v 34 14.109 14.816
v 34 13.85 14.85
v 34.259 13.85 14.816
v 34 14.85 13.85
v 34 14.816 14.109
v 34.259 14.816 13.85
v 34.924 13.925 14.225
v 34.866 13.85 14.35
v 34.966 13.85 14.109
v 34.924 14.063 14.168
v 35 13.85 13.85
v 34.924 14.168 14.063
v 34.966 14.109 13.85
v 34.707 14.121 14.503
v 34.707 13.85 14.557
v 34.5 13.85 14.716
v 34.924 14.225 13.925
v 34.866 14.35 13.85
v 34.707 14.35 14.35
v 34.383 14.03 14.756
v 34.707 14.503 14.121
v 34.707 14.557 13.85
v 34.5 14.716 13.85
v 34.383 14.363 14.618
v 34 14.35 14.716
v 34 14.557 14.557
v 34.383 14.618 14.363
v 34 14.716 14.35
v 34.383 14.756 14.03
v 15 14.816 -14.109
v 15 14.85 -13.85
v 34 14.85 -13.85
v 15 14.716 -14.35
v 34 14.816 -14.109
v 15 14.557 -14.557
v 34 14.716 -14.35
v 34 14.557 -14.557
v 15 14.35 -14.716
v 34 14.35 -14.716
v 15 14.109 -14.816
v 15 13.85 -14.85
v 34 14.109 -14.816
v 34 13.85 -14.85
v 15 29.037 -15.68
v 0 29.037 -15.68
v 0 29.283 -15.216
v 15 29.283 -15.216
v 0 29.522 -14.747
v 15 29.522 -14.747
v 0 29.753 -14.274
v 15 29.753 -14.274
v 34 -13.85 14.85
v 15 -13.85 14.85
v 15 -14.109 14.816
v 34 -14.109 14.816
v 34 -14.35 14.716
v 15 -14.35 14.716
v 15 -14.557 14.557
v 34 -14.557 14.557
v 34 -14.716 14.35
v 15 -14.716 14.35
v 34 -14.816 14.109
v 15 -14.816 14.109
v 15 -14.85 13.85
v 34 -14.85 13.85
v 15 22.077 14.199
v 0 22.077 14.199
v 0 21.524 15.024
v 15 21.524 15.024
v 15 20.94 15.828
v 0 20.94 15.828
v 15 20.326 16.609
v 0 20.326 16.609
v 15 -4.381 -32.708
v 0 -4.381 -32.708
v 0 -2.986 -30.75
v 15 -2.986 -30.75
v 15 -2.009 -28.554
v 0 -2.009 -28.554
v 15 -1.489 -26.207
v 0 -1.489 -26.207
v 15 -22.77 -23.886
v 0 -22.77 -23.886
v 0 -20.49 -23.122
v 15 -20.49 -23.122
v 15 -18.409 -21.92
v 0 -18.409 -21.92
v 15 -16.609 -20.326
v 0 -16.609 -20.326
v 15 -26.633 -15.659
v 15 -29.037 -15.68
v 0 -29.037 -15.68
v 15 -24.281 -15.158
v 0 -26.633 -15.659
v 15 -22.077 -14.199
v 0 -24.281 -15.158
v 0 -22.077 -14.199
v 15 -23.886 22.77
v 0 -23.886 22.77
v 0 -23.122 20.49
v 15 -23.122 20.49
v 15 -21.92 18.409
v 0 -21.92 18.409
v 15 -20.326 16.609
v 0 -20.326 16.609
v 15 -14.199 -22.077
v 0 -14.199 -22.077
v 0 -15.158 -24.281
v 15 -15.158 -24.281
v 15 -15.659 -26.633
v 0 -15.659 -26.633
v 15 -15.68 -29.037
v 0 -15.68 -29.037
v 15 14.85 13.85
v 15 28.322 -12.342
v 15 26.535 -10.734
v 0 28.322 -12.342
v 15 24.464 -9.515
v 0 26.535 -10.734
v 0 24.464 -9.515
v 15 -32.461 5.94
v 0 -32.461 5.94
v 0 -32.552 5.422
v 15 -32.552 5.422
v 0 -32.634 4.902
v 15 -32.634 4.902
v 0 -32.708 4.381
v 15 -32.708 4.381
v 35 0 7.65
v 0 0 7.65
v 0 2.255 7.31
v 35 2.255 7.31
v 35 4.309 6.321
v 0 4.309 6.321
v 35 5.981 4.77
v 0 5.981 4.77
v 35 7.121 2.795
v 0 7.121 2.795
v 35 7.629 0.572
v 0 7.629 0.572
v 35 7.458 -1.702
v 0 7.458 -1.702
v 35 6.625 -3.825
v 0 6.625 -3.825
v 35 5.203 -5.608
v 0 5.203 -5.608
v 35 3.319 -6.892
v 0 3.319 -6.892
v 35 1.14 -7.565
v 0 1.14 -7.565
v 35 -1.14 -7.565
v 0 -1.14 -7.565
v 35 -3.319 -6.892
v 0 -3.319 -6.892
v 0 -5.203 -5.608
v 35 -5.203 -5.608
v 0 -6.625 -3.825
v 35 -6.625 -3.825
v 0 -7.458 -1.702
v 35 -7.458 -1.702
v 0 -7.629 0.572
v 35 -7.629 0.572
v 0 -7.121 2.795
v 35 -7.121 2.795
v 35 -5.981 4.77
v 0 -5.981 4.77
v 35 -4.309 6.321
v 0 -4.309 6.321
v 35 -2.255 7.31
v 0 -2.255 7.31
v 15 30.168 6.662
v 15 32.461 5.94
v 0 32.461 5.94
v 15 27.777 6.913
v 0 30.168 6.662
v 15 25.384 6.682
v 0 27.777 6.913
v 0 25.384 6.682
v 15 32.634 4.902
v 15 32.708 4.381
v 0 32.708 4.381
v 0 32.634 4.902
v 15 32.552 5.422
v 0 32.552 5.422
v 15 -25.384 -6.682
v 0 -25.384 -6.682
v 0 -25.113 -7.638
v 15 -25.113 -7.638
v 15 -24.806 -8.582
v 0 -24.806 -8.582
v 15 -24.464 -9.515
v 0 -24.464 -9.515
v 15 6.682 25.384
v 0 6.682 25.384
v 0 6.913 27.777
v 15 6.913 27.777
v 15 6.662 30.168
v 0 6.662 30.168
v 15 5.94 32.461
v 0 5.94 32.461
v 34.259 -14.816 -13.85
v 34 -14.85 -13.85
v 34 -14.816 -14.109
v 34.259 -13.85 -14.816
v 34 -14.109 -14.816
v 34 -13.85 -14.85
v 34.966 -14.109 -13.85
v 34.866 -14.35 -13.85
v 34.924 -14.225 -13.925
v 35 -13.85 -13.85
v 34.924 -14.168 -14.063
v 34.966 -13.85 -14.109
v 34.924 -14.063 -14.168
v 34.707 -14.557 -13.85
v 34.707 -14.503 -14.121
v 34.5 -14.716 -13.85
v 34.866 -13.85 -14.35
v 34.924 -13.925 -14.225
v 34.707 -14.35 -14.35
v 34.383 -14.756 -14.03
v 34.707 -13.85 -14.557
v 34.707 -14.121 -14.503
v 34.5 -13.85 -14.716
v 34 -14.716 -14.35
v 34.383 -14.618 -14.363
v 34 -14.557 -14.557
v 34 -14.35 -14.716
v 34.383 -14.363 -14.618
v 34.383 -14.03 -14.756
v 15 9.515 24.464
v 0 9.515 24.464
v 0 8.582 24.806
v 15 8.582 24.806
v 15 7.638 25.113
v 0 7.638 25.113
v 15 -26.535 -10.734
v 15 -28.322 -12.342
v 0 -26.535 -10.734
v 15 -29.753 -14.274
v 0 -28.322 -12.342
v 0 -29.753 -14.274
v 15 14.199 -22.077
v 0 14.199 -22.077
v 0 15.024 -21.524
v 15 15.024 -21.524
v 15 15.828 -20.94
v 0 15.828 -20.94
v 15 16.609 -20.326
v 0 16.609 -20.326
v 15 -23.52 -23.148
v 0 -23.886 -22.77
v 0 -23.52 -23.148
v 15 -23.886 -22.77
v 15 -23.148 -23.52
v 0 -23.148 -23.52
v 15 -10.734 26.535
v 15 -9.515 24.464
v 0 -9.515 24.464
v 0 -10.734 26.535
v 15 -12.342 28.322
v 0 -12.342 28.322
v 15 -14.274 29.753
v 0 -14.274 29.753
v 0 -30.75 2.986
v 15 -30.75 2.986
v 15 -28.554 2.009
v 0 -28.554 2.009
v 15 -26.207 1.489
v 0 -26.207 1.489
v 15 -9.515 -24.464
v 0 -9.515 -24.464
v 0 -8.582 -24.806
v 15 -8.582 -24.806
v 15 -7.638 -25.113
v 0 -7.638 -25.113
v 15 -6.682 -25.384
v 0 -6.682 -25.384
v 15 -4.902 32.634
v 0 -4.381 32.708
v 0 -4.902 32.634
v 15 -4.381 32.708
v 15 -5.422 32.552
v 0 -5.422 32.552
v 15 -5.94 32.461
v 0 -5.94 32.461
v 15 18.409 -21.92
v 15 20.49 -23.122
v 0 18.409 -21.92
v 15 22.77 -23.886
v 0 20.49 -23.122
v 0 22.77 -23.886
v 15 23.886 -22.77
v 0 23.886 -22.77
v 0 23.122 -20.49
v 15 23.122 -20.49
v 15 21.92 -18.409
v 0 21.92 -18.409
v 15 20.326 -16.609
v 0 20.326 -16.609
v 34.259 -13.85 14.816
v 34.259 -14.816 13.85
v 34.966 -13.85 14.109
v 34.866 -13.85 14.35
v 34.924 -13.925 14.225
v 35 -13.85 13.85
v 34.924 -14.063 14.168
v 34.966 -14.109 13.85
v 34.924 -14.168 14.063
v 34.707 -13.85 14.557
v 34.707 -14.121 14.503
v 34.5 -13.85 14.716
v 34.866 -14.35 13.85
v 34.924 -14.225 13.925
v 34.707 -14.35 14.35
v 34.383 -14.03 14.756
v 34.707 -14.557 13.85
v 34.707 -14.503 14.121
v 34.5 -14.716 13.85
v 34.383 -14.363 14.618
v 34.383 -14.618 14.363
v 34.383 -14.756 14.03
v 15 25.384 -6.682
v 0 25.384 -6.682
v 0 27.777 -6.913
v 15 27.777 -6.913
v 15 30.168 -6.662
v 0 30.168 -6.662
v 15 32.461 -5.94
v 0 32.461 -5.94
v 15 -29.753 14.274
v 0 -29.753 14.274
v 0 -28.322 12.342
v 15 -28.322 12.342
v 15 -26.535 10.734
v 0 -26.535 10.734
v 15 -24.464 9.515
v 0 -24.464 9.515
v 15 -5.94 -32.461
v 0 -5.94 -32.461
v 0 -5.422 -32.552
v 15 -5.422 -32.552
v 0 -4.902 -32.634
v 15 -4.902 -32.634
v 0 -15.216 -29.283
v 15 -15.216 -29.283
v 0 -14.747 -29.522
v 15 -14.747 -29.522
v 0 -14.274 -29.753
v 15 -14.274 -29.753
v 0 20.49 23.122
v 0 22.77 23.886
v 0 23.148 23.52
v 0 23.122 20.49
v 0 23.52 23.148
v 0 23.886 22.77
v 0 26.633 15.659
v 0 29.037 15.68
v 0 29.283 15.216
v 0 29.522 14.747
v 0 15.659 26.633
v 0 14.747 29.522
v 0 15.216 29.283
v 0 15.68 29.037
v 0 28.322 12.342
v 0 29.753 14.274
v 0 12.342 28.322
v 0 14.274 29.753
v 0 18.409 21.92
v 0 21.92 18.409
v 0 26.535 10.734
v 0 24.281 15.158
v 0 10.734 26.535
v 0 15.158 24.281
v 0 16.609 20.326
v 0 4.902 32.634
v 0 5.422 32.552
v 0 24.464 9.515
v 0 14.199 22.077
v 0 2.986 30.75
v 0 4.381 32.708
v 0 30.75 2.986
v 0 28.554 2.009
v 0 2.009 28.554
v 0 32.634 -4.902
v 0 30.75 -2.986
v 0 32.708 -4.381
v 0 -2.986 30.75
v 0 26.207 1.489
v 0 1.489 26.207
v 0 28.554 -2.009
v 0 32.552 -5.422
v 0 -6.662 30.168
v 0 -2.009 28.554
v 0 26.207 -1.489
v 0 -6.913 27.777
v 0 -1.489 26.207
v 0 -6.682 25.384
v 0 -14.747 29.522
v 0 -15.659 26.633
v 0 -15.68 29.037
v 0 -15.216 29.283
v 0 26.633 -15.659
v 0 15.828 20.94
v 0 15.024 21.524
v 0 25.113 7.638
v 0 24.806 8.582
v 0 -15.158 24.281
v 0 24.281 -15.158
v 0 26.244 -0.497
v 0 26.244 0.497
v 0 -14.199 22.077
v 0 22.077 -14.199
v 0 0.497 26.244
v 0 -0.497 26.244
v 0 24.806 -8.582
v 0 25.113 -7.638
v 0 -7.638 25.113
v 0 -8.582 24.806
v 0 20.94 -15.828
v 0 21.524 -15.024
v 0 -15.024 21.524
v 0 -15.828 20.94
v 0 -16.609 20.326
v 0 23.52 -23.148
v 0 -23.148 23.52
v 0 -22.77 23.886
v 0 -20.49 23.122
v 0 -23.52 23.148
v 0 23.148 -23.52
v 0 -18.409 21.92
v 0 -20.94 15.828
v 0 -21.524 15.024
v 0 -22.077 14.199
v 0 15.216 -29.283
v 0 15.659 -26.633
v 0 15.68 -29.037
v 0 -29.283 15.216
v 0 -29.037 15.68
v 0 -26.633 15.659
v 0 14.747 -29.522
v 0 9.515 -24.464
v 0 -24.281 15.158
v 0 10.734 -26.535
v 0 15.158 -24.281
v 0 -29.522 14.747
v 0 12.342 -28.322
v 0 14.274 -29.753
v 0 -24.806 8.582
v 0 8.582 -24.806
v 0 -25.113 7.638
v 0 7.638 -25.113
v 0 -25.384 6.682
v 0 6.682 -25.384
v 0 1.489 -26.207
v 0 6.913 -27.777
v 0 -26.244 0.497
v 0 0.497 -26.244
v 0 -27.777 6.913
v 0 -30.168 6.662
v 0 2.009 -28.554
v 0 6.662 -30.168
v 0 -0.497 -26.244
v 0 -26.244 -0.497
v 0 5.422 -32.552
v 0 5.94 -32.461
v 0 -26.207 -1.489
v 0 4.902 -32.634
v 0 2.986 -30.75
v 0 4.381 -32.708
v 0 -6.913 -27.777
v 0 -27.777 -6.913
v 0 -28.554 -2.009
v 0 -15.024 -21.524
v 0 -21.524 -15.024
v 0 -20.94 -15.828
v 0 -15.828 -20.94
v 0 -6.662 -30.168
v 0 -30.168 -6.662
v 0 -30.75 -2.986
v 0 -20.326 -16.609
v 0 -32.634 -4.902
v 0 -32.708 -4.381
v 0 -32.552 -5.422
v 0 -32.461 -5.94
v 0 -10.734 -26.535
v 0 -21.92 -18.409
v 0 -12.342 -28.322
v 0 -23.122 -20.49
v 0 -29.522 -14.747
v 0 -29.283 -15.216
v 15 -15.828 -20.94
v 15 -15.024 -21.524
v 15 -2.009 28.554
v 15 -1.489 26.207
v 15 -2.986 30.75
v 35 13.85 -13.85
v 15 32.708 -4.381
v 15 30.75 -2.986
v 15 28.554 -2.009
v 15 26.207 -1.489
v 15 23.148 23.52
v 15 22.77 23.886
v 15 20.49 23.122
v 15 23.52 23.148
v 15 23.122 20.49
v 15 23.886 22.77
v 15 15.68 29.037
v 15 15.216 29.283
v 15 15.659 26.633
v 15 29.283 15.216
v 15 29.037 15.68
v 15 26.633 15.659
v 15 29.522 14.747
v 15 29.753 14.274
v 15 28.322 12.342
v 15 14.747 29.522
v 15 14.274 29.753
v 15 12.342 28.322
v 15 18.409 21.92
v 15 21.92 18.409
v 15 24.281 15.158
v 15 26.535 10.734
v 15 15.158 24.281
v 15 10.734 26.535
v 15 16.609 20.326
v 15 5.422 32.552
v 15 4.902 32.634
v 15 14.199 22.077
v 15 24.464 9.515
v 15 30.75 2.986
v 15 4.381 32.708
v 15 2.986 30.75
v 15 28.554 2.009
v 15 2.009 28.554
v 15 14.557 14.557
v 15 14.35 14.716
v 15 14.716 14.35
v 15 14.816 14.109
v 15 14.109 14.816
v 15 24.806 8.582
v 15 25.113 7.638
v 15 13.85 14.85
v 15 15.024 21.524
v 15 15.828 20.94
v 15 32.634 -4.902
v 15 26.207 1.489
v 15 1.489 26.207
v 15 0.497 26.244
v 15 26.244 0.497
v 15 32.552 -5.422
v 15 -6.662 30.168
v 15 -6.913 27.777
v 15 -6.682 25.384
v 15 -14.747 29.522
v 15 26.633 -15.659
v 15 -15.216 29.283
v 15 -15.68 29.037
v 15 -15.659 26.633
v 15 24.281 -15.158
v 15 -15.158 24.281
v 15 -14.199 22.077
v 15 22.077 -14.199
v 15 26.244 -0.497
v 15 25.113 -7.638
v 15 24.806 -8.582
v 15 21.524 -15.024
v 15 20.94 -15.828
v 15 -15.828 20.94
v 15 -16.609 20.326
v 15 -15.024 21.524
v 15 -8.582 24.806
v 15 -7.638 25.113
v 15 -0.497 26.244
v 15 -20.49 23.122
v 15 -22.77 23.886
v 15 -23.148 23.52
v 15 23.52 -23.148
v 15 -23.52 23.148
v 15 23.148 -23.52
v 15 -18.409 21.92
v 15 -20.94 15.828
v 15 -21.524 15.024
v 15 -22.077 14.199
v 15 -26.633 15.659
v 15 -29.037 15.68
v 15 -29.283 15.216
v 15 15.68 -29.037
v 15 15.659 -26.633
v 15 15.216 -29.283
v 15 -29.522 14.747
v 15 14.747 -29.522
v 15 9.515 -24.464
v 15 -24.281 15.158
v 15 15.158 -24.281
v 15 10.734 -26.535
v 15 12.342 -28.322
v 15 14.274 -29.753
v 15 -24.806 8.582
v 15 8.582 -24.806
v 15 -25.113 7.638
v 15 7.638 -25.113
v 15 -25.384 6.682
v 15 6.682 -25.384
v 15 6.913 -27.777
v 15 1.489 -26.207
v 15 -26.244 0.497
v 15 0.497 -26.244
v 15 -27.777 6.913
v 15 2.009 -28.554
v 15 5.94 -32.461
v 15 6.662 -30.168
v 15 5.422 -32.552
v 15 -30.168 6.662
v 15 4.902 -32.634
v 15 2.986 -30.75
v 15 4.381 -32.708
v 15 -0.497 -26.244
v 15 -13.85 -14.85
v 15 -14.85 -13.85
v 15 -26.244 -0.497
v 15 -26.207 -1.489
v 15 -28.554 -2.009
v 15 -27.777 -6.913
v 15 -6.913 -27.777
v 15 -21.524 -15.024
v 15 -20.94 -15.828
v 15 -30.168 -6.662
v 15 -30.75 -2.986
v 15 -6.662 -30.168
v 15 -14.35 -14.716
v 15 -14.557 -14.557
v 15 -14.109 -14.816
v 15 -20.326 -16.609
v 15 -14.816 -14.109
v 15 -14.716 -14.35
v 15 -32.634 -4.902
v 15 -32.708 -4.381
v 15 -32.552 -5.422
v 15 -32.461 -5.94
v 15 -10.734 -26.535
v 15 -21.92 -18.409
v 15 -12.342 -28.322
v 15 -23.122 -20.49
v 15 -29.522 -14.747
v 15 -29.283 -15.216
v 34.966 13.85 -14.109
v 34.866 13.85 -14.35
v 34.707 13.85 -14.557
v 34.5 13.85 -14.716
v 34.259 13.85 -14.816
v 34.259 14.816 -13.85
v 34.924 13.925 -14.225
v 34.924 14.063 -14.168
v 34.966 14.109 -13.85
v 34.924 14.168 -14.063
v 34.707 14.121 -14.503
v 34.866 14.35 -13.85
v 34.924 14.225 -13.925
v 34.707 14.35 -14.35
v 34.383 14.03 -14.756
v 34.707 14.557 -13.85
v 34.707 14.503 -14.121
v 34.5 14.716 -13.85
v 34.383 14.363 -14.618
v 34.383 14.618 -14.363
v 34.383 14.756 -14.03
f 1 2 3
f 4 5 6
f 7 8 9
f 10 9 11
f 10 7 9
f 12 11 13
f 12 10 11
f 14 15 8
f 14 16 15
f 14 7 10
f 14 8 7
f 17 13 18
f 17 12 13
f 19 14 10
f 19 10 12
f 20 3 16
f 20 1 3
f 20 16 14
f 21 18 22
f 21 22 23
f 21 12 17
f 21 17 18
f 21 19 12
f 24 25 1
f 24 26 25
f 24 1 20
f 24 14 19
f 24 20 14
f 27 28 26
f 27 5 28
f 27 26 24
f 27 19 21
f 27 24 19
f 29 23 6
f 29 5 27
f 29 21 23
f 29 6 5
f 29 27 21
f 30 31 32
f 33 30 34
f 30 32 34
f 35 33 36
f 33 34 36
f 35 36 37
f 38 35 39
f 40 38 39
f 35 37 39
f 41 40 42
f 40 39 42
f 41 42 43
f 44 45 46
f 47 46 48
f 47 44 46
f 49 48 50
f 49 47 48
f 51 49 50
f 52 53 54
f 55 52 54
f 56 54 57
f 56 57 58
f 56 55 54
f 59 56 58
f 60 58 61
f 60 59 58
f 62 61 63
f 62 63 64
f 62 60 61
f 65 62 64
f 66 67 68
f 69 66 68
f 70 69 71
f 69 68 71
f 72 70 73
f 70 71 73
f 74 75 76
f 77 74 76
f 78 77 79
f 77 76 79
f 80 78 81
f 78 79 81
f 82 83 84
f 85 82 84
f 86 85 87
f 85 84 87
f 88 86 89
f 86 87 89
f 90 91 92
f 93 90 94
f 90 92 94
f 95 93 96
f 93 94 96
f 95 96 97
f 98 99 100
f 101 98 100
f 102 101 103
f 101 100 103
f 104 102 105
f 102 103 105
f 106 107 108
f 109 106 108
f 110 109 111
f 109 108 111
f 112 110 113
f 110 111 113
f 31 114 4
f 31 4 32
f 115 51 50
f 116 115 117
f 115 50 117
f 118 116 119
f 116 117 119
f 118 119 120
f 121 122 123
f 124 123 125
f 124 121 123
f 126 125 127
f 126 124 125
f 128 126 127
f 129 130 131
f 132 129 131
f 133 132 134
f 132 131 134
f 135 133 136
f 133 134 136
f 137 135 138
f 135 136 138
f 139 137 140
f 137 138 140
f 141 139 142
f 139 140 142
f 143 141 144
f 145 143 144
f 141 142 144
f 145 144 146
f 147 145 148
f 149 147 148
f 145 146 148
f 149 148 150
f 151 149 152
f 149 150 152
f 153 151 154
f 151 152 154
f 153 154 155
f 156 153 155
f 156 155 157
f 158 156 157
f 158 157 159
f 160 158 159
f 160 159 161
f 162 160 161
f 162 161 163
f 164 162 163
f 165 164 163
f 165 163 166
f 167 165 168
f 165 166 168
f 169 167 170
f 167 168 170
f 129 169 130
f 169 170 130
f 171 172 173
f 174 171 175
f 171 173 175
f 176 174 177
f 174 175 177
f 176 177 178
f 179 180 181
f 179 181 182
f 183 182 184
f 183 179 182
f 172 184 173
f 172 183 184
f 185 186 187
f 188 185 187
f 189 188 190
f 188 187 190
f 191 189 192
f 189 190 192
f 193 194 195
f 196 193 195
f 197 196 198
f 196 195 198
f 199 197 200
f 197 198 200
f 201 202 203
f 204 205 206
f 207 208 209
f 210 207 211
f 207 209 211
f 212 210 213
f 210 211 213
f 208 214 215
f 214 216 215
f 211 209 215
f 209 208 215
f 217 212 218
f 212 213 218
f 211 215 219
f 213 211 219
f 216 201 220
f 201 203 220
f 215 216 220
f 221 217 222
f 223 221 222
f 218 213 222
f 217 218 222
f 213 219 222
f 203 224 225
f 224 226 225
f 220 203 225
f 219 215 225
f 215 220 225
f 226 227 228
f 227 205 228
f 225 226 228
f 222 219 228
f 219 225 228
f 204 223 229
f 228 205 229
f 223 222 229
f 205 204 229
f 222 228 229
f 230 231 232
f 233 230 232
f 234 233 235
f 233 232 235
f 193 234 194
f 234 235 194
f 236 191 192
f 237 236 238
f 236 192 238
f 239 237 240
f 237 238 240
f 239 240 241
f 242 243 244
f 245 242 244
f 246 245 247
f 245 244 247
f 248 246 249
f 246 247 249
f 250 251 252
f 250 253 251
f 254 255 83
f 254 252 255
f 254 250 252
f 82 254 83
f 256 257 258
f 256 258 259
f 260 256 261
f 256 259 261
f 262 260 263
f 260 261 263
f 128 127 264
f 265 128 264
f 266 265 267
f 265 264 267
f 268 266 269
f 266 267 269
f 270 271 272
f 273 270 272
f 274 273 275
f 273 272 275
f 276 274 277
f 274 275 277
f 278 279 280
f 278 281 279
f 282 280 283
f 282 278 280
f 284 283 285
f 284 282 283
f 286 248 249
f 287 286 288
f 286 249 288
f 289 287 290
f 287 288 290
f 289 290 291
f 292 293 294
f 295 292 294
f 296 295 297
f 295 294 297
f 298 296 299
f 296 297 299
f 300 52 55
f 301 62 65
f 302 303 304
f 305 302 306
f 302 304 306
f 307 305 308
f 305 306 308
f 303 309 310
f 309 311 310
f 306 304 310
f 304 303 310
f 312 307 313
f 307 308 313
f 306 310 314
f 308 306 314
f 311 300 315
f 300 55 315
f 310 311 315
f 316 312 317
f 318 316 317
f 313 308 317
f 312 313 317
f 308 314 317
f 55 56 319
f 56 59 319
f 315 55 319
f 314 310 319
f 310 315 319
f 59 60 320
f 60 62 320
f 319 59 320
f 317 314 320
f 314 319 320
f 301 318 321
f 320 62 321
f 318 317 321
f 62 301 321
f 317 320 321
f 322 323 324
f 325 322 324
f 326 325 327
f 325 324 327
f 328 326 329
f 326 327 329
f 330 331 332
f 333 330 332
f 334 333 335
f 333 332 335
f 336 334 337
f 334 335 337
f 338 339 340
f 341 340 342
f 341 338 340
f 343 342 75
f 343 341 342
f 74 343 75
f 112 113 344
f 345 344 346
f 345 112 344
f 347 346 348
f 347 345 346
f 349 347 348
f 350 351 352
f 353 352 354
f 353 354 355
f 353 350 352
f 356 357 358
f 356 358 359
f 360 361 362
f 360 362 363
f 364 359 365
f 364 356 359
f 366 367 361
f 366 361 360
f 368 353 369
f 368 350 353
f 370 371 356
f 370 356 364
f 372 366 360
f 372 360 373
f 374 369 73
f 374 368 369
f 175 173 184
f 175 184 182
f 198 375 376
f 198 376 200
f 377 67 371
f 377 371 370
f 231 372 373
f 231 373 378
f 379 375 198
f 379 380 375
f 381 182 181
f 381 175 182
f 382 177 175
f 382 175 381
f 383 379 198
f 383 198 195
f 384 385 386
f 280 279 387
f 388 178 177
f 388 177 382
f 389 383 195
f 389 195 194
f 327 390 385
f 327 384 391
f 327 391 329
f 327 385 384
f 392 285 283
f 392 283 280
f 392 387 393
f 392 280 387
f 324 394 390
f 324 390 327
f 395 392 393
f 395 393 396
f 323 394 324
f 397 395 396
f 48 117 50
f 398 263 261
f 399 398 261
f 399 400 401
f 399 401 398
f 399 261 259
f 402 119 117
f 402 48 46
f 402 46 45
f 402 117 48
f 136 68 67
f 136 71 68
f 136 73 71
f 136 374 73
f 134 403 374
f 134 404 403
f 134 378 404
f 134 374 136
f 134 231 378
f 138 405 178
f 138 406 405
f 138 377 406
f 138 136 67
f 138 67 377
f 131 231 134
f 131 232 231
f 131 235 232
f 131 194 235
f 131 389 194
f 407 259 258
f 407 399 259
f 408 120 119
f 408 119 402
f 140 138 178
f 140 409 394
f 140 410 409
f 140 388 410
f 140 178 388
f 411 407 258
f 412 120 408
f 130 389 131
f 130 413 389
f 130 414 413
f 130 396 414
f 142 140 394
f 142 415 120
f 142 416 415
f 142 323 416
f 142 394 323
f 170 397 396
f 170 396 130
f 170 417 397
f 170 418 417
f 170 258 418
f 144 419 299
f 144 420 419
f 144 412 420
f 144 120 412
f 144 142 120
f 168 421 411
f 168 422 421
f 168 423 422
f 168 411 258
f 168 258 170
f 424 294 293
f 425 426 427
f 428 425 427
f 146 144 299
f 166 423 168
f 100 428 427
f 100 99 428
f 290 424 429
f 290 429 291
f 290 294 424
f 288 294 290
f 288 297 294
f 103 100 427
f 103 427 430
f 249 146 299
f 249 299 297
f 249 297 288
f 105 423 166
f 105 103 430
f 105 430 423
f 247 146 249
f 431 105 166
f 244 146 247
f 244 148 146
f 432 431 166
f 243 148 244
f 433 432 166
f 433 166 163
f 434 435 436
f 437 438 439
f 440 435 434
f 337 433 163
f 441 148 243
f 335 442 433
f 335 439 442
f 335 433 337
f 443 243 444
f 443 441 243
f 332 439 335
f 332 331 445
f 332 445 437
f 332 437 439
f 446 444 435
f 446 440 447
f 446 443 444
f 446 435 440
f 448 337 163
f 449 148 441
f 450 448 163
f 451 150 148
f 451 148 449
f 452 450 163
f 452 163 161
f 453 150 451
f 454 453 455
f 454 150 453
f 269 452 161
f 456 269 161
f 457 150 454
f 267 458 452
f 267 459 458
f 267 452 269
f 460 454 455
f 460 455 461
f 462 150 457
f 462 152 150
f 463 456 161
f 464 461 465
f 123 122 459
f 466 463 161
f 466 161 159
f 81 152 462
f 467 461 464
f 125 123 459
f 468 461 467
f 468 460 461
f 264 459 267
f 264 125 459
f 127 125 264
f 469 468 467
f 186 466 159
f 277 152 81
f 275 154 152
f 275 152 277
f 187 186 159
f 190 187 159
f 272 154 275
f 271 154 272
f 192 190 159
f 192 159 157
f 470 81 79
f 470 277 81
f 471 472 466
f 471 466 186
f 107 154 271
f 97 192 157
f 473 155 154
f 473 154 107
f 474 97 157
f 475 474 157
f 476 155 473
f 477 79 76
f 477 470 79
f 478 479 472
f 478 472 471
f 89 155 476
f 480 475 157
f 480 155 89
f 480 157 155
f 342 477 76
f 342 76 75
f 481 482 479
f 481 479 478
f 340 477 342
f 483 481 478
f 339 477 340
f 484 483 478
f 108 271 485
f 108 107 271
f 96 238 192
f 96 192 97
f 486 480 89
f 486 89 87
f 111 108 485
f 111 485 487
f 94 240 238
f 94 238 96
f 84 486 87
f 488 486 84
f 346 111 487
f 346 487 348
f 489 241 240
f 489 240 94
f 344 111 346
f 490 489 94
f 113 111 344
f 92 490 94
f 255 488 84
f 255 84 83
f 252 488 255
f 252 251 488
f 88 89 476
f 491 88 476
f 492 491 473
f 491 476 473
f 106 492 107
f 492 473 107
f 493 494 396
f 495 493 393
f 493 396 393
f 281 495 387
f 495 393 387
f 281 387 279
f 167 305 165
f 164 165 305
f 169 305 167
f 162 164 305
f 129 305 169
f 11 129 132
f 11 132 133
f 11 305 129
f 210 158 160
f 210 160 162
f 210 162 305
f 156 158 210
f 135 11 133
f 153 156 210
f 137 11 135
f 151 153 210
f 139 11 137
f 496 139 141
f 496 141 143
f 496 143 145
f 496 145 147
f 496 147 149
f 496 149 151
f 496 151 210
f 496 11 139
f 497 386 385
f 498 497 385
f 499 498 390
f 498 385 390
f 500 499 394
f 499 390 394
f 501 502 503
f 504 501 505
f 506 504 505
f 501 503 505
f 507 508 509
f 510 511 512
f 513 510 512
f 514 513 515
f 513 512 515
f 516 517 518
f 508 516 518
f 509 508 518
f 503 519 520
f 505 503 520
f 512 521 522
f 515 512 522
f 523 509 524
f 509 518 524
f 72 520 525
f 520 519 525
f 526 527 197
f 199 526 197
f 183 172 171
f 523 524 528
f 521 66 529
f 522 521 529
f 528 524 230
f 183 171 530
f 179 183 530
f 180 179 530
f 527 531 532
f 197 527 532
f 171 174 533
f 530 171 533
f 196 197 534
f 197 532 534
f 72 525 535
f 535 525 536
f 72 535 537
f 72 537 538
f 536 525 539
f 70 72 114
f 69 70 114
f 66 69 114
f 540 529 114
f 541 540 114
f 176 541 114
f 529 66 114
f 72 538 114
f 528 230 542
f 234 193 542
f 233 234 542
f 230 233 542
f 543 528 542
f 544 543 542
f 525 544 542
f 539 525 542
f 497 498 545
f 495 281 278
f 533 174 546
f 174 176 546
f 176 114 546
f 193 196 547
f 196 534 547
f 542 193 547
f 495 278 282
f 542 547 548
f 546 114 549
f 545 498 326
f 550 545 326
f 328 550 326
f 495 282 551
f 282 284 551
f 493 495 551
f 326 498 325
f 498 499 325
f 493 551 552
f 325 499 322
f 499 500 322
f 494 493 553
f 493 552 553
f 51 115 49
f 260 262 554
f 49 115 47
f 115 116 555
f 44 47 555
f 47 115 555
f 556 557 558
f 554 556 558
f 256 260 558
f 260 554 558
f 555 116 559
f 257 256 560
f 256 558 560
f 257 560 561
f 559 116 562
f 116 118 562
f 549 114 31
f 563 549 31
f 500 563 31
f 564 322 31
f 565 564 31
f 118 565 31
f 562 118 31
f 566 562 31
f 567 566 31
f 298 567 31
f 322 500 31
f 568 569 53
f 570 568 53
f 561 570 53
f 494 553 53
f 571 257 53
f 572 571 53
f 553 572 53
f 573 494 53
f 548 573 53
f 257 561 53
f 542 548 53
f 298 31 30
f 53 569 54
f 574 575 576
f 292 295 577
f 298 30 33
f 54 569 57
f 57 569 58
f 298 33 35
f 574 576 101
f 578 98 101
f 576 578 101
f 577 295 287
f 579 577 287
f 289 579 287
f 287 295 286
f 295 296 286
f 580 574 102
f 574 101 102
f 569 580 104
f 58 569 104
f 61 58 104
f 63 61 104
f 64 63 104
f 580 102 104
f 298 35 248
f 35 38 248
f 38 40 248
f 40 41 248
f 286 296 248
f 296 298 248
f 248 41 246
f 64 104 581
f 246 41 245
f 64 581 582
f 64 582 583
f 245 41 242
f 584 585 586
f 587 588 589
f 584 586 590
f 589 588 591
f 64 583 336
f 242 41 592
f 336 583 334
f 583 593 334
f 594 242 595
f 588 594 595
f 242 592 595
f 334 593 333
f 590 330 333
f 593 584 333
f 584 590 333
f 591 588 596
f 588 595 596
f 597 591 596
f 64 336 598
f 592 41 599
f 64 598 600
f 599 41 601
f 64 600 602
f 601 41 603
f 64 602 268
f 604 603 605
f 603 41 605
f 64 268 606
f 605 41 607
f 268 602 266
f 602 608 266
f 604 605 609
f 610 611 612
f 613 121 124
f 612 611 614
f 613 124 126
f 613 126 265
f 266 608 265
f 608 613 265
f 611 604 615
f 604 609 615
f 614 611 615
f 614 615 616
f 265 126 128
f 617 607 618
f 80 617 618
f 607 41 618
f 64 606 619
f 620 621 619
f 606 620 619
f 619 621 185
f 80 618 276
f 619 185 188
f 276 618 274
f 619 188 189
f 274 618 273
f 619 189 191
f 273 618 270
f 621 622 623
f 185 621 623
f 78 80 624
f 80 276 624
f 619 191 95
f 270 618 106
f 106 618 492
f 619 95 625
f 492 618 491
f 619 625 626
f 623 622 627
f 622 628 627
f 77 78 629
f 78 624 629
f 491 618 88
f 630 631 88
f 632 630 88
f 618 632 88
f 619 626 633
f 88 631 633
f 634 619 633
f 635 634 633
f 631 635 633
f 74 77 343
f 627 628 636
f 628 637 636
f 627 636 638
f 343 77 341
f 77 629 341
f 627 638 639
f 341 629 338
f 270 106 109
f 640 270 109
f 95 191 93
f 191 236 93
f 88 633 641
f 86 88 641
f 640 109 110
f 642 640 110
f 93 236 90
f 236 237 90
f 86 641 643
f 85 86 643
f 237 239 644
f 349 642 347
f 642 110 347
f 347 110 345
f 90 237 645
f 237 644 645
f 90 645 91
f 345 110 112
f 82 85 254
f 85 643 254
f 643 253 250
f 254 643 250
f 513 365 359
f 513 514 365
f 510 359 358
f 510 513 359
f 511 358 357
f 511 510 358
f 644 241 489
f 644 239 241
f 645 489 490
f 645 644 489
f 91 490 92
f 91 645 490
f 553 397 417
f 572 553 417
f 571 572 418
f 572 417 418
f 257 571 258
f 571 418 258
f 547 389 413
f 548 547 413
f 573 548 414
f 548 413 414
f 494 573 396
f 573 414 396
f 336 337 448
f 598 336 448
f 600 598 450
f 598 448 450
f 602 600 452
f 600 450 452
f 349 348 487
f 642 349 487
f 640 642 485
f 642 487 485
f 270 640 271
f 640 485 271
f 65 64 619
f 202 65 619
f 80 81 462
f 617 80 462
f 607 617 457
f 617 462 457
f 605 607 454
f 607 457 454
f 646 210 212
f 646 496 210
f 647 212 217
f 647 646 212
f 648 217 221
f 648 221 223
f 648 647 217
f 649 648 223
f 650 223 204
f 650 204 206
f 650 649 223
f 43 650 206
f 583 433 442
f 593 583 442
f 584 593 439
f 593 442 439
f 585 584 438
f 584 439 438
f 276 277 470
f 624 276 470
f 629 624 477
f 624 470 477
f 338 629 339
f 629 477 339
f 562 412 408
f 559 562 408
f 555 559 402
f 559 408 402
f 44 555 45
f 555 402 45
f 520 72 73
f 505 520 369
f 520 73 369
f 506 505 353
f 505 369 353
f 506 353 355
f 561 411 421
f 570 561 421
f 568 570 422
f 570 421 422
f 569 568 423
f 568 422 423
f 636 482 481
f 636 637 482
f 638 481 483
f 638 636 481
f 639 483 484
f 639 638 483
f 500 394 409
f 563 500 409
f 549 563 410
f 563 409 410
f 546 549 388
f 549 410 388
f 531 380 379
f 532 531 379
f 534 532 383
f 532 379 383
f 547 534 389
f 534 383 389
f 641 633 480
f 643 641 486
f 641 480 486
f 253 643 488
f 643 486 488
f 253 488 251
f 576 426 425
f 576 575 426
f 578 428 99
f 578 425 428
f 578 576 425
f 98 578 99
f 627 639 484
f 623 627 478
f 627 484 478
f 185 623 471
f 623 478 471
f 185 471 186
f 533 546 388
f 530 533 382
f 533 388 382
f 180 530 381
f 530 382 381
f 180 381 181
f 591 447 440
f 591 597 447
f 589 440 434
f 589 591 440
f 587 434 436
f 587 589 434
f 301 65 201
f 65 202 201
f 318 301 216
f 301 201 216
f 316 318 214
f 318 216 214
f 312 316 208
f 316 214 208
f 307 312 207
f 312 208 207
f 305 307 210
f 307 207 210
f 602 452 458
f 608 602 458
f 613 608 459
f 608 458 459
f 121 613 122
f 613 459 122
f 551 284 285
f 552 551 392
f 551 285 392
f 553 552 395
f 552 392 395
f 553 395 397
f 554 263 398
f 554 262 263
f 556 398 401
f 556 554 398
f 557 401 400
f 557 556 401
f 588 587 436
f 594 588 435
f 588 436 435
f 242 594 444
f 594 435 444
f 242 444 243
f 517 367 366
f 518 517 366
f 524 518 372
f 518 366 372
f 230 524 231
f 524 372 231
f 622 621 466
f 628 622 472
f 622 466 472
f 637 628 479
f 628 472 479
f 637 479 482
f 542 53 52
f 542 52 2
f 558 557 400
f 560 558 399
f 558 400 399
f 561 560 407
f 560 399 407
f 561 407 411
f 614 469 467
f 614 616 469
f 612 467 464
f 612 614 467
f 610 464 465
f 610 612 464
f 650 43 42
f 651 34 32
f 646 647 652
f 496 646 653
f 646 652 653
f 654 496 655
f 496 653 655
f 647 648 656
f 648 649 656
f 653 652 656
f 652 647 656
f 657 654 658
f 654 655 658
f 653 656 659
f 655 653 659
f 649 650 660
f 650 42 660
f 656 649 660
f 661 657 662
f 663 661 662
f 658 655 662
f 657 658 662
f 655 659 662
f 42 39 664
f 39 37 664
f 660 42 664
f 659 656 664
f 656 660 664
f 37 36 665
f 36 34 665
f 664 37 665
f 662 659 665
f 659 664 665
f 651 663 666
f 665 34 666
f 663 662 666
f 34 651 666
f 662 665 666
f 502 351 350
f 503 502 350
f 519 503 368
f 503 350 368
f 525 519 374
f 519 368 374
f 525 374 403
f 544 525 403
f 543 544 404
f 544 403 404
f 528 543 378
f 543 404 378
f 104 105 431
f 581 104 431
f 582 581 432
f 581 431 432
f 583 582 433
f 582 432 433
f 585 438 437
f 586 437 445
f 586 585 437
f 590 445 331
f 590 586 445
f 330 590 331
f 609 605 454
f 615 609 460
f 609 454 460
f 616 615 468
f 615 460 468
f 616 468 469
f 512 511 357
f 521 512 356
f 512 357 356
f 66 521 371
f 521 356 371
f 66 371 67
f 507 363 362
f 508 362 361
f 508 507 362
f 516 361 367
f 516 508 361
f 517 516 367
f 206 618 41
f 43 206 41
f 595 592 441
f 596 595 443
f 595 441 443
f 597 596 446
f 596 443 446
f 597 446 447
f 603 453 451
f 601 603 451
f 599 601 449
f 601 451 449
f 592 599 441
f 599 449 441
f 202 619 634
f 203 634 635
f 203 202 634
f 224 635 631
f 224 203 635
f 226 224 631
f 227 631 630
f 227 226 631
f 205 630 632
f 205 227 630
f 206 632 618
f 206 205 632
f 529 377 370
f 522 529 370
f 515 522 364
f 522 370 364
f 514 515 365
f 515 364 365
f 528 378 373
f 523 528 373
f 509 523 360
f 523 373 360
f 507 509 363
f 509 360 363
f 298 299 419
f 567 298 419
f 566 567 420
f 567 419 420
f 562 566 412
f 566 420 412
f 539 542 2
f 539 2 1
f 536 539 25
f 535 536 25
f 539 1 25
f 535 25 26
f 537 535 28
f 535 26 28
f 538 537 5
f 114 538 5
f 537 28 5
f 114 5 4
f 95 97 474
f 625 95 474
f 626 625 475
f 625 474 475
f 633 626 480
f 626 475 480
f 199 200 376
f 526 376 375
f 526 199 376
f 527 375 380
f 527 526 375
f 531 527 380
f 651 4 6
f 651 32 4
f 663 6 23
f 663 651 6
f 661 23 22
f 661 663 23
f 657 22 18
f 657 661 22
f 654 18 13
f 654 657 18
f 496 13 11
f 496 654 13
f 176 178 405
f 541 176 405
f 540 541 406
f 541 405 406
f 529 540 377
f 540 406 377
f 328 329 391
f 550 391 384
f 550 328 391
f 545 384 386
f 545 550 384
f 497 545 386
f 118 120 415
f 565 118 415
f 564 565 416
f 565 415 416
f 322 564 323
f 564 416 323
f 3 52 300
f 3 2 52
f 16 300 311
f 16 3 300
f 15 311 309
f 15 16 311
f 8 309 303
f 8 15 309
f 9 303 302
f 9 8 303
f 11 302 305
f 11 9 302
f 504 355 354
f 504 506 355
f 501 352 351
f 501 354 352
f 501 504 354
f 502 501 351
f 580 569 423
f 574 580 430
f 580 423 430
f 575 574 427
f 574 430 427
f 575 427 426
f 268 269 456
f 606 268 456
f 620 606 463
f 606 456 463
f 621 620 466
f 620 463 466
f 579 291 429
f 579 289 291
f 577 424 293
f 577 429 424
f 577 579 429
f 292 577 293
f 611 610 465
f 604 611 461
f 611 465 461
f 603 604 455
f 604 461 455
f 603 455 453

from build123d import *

# Parameters (mm, degrees)
BASPROSKE_W         = 15
BASPROSKE_H         = 33
TOOTHCUT_DEPTH      = 50.020403915
TEETHCUTS_COUNT     = 20
TEETHCUTS_ANGLE     = 342
BORSKE_R            = 2
BORE_DEPTH          = 50.0000508
SKETCH1_W           = 29.7
SKETCH1_H           = 29.7
BOSS_EXTRUDE1_DEPTH = 20
SKETCH2_R           = 7.65
CUT_EXTRUDE1_DEPTH  = 35
FILLET2_R           = 1


with BuildPart() as part:
    # BasProSke → Base-Revolve (revolve)
    with BuildSketch(Plane(origin=(0, 0, 0), x_dir=(1, 0, 0), z_dir=(0, 1, 0)), mode=Mode.PRIVATE) as base_revolve_sk:
        with Locations((7.5, 16.5)):
            Rectangle(BASPROSKE_W, BASPROSKE_H)
    revolve(base_revolve_sk.sketch.rotate(Axis((-10, 0, 0), (1, 0, 0)), 180), axis=Axis((-10, 0, 0), (1, 0, 0)))

    # TooCutSke → ToothCut (cut, through all)
    with BuildSketch(Plane(origin=(0, 0, 0), x_dir=(0, 0, -1), z_dir=(1, 0, 0))):
        with BuildLine():
            ThreePointArc((1.489278925, 26.206717637), (0, 26.249), (-1.489278925, 26.206717637))
            ThreePointArc((-1.489278925, 26.206717637), (-2.448651415, 29.690511169), (-4.401620335, 32.730762038))
            ThreePointArc((-4.401620335, 32.730762038), (0, 33.0254), (4.401620335, 32.730762038))
            ThreePointArc((4.401620335, 32.730762038), (2.448651415, 29.690511169), (1.489278925, 26.206717637))
        make_face()
    toothcut = extrude(amount=TOOTHCUT_DEPTH, mode=Mode.SUBTRACT)

    # TeethCuts: ToothCut ×20 about axis
    teethcuts_axis = Axis((-10, 0, 0), (1, 0, 0))
    for i in range(1, TEETHCUTS_COUNT):
        add(toothcut.rotate(teethcuts_axis, i * TEETHCUTS_ANGLE / (TEETHCUTS_COUNT - 1)), mode=Mode.SUBTRACT)

    # BorSke → Bore (cut, symmetric)
    with BuildSketch(Plane(origin=(0, 0, 0), x_dir=(0, 0, -1), z_dir=(1, 0, 0))):
        with Locations(Location((0, 0, 0), (0, 0, 180))):
            Circle(BORSKE_R)
    extrude(amount=BORE_DEPTH, both=True, mode=Mode.SUBTRACT)

    # Sketch1 → Boss-Extrude1 (add)
    with BuildSketch(Plane(origin=(15, 0, 0), x_dir=(0, 0, -1), z_dir=(1, 0, 0))):
        Rectangle(SKETCH1_W, SKETCH1_H)
    extrude(amount=BOSS_EXTRUDE1_DEPTH)

    # Sketch2 → Cut-Extrude1 (cut)
    with BuildSketch(Plane.ZY):
        Circle(SKETCH2_R)
    extrude(amount=-CUT_EXTRUDE1_DEPTH, mode=Mode.SUBTRACT)

    # Fillet2
    fillet2_edges = [part.edges().sort_by_distance(p)[0] for p in [
        (25, 14.85, 14.85),
        (25, -14.85, 14.85),
        (25, -14.85, -14.85),
        (25, 14.85, -14.85),
        (35, 0, 14.85),
        (35, -14.85, 0),
        (35, 0, -14.85),
        (35, 14.85, 0),
    ]]
    fillet(fillet2_edges, radius=FILLET2_R)


solid = part.part
